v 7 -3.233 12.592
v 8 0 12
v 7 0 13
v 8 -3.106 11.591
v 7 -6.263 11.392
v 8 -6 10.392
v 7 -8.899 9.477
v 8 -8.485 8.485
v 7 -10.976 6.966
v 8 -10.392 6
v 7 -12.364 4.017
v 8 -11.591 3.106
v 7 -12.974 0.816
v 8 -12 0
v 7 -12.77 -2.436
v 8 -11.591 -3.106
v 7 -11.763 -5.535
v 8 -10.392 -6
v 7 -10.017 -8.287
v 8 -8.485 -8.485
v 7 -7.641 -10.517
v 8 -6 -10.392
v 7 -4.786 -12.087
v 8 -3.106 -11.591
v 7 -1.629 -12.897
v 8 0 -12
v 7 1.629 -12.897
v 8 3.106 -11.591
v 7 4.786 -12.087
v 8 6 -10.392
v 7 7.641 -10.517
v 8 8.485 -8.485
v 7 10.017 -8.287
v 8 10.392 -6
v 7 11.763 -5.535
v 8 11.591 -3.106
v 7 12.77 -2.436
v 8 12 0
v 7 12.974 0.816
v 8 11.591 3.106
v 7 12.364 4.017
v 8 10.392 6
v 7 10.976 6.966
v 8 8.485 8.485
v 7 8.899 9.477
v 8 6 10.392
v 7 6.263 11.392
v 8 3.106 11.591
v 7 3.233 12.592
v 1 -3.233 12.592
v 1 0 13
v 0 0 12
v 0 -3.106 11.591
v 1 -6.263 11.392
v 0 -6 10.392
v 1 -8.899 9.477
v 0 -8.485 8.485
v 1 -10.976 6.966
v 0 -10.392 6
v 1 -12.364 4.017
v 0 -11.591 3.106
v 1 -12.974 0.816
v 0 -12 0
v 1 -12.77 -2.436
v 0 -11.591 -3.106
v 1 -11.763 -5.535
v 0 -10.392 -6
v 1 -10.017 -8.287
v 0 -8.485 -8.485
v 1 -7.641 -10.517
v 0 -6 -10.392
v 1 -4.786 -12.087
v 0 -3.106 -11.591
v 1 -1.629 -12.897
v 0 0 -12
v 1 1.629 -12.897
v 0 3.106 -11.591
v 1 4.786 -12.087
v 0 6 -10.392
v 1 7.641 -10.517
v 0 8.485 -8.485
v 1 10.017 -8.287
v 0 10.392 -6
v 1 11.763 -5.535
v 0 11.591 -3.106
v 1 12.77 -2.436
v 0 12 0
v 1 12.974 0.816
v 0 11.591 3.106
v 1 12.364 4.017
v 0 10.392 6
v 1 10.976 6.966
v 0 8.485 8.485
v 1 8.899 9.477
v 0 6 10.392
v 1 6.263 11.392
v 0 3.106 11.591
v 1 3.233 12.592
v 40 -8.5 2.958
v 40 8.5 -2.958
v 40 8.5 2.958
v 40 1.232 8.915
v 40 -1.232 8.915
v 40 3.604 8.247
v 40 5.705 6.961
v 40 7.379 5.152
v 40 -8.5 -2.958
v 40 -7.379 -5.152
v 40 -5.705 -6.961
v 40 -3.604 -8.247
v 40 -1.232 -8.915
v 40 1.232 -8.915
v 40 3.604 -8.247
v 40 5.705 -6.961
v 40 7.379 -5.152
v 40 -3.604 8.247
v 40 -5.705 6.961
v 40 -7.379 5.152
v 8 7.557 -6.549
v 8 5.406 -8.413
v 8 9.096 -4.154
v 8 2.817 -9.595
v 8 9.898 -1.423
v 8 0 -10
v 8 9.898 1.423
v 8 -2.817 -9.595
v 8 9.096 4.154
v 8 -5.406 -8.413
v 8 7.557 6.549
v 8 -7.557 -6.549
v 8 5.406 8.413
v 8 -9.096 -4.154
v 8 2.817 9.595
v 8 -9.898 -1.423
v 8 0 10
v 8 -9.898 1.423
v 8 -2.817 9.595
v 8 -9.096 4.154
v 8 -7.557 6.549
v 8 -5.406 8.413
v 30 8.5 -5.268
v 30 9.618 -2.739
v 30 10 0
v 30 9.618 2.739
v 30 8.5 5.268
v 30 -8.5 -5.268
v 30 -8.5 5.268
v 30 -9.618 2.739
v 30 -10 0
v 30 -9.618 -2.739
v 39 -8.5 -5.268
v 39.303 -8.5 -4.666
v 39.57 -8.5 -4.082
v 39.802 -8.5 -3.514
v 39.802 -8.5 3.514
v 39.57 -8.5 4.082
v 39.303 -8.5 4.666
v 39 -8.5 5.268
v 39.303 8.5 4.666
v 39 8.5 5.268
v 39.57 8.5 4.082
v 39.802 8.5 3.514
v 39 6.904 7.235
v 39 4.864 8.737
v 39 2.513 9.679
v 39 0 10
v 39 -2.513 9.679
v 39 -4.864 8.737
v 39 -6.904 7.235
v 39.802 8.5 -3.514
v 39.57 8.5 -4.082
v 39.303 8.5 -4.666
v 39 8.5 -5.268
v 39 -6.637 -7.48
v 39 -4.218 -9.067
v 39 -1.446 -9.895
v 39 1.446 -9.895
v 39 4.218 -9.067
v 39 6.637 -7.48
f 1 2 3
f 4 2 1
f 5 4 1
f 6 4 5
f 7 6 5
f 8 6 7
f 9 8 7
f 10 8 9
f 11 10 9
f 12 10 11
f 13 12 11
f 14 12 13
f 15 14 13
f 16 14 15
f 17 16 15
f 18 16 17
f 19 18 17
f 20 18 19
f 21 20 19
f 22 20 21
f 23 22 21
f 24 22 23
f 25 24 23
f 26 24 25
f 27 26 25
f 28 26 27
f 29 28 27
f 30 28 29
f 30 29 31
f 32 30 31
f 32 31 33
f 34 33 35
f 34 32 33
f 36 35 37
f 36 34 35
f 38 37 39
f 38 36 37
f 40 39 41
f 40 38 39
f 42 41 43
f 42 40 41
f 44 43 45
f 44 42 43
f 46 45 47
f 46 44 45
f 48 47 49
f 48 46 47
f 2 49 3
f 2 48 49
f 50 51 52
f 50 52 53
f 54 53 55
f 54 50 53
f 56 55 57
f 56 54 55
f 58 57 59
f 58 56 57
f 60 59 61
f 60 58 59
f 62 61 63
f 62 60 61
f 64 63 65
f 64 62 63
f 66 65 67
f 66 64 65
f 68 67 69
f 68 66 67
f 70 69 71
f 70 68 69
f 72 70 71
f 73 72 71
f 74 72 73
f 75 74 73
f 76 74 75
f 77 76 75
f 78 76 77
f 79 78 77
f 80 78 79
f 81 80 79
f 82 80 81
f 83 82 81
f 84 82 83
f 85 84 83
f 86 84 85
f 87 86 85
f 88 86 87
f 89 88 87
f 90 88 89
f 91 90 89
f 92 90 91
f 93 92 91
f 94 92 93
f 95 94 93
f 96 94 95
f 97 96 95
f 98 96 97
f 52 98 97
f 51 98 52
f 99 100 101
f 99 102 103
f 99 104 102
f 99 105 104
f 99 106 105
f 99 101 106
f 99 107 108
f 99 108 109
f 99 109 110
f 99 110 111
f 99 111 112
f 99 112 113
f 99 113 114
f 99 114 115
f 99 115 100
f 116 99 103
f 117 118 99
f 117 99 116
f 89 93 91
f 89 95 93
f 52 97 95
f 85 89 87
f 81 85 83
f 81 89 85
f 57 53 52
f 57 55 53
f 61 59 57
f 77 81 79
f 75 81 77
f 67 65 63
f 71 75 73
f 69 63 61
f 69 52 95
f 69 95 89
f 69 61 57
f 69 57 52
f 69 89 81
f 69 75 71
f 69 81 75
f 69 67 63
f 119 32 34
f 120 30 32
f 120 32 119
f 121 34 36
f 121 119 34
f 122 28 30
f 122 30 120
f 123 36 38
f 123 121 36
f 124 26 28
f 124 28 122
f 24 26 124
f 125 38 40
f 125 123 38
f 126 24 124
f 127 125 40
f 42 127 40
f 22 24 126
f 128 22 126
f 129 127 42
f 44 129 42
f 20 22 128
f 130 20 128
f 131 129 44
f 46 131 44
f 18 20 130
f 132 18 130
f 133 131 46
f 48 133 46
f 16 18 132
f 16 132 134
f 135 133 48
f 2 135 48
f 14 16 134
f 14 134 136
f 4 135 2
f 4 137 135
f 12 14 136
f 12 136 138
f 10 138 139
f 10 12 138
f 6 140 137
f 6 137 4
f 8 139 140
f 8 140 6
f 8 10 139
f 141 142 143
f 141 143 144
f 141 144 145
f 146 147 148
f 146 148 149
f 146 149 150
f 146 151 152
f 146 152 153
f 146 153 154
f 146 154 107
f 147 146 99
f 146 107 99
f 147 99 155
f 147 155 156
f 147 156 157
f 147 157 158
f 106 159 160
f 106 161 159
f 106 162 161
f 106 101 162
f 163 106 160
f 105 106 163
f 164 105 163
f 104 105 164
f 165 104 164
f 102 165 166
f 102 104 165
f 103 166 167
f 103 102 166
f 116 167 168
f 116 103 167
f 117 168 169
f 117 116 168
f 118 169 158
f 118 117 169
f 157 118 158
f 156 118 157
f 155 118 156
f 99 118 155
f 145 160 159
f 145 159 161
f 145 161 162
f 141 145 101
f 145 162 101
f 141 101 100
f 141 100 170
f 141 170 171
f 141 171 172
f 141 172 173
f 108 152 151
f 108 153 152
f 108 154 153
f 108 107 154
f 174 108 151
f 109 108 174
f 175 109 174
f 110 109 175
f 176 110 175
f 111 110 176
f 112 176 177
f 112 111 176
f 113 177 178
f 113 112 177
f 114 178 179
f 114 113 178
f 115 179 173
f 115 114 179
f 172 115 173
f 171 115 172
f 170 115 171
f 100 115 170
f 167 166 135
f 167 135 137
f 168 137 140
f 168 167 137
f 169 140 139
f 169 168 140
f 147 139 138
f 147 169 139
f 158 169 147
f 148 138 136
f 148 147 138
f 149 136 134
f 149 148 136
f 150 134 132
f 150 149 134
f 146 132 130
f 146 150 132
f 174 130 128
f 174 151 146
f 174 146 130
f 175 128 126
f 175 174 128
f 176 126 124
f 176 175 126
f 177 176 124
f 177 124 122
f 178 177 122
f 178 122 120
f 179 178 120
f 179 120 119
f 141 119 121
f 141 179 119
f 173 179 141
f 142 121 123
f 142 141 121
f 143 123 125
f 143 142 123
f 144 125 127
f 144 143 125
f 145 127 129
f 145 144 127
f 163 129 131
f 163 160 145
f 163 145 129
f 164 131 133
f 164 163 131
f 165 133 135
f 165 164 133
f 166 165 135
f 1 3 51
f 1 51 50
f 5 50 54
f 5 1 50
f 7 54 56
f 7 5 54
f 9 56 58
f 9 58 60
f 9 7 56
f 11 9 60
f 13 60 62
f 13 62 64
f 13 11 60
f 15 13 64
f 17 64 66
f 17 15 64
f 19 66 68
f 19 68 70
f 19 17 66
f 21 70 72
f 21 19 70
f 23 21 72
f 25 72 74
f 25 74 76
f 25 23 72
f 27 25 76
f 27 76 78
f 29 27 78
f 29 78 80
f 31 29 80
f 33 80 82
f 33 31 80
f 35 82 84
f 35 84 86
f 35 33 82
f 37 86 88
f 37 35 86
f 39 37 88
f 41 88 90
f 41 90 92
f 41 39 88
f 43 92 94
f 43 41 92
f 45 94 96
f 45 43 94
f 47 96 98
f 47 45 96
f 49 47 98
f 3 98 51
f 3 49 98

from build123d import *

# Parameters (mm, degrees)
CHAMFER1_SIZE      = 1
CUT_EXTRUDE1_DEPTH = 10


with BuildPart() as part:
    # Sketch1 → Revolve1 (revolve)
    with BuildSketch(Plane.XY, mode=Mode.PRIVATE) as revolve1_sk:
        Polygon((0, 0), (0, 13), (8, 13), (8, 10), (40, 10), (40, 0), align=None)
    revolve(revolve1_sk.sketch.rotate(Axis((0, 0, 0), (1, 0, 0)), 90), axis=Axis((0, 0, 0), (1, 0, 0)))

    # Chamfer1
    chamfer1_edges = [part.edges().sort_by_distance(p)[0] for p in [
        (40, 0, -10),
        (8, 0, -13),
        (0, 0, -13),
    ]]
    chamfer(chamfer1_edges, length=CHAMFER1_SIZE)

    # Sketch2 → Cut-Extrude1 (cut)
    with BuildSketch(Plane(origin=(40, 0, 0), x_dir=(0, 0, -1), z_dir=(1, 0, 0))):
        with BuildLine():
            ThreePointArc((5.267826876, 8.5), (0, 10), (-5.267826876, 8.5))
            Line((-5.267826876, 8.5), (-2.958039892, 8.5))
            ThreePointArc((-2.958039892, 8.5), (0, 9), (2.958039892, 8.5))
            Line((2.958039892, 8.5), (5.267826876, 8.5))
        make_face()
        with BuildLine():
            ThreePointArc((2.958039892, 8.5), (0, 9), (-2.958039892, 8.5))
            Line((-2.958039892, 8.5), (2.958039892, 8.5))
        make_face()
        with BuildLine():
            Line((-2.958039892, -8.5), (-5.267826876, -8.5))
            ThreePointArc((-5.267826876, -8.5), (0, -10), (5.267826876, -8.5))
            Line((5.267826876, -8.5), (2.958039892, -8.5))
            ThreePointArc((2.958039892, -8.5), (0, -9), (-2.958039892, -8.5))
        make_face()
        with BuildLine():
            Line((2.958039892, -8.5), (-2.958039892, -8.5))
            ThreePointArc((-2.958039892, -8.5), (0, -9), (2.958039892, -8.5))
        make_face()
    extrude(amount=-CUT_EXTRUDE1_DEPTH, mode=Mode.SUBTRACT)


solid = part.part
